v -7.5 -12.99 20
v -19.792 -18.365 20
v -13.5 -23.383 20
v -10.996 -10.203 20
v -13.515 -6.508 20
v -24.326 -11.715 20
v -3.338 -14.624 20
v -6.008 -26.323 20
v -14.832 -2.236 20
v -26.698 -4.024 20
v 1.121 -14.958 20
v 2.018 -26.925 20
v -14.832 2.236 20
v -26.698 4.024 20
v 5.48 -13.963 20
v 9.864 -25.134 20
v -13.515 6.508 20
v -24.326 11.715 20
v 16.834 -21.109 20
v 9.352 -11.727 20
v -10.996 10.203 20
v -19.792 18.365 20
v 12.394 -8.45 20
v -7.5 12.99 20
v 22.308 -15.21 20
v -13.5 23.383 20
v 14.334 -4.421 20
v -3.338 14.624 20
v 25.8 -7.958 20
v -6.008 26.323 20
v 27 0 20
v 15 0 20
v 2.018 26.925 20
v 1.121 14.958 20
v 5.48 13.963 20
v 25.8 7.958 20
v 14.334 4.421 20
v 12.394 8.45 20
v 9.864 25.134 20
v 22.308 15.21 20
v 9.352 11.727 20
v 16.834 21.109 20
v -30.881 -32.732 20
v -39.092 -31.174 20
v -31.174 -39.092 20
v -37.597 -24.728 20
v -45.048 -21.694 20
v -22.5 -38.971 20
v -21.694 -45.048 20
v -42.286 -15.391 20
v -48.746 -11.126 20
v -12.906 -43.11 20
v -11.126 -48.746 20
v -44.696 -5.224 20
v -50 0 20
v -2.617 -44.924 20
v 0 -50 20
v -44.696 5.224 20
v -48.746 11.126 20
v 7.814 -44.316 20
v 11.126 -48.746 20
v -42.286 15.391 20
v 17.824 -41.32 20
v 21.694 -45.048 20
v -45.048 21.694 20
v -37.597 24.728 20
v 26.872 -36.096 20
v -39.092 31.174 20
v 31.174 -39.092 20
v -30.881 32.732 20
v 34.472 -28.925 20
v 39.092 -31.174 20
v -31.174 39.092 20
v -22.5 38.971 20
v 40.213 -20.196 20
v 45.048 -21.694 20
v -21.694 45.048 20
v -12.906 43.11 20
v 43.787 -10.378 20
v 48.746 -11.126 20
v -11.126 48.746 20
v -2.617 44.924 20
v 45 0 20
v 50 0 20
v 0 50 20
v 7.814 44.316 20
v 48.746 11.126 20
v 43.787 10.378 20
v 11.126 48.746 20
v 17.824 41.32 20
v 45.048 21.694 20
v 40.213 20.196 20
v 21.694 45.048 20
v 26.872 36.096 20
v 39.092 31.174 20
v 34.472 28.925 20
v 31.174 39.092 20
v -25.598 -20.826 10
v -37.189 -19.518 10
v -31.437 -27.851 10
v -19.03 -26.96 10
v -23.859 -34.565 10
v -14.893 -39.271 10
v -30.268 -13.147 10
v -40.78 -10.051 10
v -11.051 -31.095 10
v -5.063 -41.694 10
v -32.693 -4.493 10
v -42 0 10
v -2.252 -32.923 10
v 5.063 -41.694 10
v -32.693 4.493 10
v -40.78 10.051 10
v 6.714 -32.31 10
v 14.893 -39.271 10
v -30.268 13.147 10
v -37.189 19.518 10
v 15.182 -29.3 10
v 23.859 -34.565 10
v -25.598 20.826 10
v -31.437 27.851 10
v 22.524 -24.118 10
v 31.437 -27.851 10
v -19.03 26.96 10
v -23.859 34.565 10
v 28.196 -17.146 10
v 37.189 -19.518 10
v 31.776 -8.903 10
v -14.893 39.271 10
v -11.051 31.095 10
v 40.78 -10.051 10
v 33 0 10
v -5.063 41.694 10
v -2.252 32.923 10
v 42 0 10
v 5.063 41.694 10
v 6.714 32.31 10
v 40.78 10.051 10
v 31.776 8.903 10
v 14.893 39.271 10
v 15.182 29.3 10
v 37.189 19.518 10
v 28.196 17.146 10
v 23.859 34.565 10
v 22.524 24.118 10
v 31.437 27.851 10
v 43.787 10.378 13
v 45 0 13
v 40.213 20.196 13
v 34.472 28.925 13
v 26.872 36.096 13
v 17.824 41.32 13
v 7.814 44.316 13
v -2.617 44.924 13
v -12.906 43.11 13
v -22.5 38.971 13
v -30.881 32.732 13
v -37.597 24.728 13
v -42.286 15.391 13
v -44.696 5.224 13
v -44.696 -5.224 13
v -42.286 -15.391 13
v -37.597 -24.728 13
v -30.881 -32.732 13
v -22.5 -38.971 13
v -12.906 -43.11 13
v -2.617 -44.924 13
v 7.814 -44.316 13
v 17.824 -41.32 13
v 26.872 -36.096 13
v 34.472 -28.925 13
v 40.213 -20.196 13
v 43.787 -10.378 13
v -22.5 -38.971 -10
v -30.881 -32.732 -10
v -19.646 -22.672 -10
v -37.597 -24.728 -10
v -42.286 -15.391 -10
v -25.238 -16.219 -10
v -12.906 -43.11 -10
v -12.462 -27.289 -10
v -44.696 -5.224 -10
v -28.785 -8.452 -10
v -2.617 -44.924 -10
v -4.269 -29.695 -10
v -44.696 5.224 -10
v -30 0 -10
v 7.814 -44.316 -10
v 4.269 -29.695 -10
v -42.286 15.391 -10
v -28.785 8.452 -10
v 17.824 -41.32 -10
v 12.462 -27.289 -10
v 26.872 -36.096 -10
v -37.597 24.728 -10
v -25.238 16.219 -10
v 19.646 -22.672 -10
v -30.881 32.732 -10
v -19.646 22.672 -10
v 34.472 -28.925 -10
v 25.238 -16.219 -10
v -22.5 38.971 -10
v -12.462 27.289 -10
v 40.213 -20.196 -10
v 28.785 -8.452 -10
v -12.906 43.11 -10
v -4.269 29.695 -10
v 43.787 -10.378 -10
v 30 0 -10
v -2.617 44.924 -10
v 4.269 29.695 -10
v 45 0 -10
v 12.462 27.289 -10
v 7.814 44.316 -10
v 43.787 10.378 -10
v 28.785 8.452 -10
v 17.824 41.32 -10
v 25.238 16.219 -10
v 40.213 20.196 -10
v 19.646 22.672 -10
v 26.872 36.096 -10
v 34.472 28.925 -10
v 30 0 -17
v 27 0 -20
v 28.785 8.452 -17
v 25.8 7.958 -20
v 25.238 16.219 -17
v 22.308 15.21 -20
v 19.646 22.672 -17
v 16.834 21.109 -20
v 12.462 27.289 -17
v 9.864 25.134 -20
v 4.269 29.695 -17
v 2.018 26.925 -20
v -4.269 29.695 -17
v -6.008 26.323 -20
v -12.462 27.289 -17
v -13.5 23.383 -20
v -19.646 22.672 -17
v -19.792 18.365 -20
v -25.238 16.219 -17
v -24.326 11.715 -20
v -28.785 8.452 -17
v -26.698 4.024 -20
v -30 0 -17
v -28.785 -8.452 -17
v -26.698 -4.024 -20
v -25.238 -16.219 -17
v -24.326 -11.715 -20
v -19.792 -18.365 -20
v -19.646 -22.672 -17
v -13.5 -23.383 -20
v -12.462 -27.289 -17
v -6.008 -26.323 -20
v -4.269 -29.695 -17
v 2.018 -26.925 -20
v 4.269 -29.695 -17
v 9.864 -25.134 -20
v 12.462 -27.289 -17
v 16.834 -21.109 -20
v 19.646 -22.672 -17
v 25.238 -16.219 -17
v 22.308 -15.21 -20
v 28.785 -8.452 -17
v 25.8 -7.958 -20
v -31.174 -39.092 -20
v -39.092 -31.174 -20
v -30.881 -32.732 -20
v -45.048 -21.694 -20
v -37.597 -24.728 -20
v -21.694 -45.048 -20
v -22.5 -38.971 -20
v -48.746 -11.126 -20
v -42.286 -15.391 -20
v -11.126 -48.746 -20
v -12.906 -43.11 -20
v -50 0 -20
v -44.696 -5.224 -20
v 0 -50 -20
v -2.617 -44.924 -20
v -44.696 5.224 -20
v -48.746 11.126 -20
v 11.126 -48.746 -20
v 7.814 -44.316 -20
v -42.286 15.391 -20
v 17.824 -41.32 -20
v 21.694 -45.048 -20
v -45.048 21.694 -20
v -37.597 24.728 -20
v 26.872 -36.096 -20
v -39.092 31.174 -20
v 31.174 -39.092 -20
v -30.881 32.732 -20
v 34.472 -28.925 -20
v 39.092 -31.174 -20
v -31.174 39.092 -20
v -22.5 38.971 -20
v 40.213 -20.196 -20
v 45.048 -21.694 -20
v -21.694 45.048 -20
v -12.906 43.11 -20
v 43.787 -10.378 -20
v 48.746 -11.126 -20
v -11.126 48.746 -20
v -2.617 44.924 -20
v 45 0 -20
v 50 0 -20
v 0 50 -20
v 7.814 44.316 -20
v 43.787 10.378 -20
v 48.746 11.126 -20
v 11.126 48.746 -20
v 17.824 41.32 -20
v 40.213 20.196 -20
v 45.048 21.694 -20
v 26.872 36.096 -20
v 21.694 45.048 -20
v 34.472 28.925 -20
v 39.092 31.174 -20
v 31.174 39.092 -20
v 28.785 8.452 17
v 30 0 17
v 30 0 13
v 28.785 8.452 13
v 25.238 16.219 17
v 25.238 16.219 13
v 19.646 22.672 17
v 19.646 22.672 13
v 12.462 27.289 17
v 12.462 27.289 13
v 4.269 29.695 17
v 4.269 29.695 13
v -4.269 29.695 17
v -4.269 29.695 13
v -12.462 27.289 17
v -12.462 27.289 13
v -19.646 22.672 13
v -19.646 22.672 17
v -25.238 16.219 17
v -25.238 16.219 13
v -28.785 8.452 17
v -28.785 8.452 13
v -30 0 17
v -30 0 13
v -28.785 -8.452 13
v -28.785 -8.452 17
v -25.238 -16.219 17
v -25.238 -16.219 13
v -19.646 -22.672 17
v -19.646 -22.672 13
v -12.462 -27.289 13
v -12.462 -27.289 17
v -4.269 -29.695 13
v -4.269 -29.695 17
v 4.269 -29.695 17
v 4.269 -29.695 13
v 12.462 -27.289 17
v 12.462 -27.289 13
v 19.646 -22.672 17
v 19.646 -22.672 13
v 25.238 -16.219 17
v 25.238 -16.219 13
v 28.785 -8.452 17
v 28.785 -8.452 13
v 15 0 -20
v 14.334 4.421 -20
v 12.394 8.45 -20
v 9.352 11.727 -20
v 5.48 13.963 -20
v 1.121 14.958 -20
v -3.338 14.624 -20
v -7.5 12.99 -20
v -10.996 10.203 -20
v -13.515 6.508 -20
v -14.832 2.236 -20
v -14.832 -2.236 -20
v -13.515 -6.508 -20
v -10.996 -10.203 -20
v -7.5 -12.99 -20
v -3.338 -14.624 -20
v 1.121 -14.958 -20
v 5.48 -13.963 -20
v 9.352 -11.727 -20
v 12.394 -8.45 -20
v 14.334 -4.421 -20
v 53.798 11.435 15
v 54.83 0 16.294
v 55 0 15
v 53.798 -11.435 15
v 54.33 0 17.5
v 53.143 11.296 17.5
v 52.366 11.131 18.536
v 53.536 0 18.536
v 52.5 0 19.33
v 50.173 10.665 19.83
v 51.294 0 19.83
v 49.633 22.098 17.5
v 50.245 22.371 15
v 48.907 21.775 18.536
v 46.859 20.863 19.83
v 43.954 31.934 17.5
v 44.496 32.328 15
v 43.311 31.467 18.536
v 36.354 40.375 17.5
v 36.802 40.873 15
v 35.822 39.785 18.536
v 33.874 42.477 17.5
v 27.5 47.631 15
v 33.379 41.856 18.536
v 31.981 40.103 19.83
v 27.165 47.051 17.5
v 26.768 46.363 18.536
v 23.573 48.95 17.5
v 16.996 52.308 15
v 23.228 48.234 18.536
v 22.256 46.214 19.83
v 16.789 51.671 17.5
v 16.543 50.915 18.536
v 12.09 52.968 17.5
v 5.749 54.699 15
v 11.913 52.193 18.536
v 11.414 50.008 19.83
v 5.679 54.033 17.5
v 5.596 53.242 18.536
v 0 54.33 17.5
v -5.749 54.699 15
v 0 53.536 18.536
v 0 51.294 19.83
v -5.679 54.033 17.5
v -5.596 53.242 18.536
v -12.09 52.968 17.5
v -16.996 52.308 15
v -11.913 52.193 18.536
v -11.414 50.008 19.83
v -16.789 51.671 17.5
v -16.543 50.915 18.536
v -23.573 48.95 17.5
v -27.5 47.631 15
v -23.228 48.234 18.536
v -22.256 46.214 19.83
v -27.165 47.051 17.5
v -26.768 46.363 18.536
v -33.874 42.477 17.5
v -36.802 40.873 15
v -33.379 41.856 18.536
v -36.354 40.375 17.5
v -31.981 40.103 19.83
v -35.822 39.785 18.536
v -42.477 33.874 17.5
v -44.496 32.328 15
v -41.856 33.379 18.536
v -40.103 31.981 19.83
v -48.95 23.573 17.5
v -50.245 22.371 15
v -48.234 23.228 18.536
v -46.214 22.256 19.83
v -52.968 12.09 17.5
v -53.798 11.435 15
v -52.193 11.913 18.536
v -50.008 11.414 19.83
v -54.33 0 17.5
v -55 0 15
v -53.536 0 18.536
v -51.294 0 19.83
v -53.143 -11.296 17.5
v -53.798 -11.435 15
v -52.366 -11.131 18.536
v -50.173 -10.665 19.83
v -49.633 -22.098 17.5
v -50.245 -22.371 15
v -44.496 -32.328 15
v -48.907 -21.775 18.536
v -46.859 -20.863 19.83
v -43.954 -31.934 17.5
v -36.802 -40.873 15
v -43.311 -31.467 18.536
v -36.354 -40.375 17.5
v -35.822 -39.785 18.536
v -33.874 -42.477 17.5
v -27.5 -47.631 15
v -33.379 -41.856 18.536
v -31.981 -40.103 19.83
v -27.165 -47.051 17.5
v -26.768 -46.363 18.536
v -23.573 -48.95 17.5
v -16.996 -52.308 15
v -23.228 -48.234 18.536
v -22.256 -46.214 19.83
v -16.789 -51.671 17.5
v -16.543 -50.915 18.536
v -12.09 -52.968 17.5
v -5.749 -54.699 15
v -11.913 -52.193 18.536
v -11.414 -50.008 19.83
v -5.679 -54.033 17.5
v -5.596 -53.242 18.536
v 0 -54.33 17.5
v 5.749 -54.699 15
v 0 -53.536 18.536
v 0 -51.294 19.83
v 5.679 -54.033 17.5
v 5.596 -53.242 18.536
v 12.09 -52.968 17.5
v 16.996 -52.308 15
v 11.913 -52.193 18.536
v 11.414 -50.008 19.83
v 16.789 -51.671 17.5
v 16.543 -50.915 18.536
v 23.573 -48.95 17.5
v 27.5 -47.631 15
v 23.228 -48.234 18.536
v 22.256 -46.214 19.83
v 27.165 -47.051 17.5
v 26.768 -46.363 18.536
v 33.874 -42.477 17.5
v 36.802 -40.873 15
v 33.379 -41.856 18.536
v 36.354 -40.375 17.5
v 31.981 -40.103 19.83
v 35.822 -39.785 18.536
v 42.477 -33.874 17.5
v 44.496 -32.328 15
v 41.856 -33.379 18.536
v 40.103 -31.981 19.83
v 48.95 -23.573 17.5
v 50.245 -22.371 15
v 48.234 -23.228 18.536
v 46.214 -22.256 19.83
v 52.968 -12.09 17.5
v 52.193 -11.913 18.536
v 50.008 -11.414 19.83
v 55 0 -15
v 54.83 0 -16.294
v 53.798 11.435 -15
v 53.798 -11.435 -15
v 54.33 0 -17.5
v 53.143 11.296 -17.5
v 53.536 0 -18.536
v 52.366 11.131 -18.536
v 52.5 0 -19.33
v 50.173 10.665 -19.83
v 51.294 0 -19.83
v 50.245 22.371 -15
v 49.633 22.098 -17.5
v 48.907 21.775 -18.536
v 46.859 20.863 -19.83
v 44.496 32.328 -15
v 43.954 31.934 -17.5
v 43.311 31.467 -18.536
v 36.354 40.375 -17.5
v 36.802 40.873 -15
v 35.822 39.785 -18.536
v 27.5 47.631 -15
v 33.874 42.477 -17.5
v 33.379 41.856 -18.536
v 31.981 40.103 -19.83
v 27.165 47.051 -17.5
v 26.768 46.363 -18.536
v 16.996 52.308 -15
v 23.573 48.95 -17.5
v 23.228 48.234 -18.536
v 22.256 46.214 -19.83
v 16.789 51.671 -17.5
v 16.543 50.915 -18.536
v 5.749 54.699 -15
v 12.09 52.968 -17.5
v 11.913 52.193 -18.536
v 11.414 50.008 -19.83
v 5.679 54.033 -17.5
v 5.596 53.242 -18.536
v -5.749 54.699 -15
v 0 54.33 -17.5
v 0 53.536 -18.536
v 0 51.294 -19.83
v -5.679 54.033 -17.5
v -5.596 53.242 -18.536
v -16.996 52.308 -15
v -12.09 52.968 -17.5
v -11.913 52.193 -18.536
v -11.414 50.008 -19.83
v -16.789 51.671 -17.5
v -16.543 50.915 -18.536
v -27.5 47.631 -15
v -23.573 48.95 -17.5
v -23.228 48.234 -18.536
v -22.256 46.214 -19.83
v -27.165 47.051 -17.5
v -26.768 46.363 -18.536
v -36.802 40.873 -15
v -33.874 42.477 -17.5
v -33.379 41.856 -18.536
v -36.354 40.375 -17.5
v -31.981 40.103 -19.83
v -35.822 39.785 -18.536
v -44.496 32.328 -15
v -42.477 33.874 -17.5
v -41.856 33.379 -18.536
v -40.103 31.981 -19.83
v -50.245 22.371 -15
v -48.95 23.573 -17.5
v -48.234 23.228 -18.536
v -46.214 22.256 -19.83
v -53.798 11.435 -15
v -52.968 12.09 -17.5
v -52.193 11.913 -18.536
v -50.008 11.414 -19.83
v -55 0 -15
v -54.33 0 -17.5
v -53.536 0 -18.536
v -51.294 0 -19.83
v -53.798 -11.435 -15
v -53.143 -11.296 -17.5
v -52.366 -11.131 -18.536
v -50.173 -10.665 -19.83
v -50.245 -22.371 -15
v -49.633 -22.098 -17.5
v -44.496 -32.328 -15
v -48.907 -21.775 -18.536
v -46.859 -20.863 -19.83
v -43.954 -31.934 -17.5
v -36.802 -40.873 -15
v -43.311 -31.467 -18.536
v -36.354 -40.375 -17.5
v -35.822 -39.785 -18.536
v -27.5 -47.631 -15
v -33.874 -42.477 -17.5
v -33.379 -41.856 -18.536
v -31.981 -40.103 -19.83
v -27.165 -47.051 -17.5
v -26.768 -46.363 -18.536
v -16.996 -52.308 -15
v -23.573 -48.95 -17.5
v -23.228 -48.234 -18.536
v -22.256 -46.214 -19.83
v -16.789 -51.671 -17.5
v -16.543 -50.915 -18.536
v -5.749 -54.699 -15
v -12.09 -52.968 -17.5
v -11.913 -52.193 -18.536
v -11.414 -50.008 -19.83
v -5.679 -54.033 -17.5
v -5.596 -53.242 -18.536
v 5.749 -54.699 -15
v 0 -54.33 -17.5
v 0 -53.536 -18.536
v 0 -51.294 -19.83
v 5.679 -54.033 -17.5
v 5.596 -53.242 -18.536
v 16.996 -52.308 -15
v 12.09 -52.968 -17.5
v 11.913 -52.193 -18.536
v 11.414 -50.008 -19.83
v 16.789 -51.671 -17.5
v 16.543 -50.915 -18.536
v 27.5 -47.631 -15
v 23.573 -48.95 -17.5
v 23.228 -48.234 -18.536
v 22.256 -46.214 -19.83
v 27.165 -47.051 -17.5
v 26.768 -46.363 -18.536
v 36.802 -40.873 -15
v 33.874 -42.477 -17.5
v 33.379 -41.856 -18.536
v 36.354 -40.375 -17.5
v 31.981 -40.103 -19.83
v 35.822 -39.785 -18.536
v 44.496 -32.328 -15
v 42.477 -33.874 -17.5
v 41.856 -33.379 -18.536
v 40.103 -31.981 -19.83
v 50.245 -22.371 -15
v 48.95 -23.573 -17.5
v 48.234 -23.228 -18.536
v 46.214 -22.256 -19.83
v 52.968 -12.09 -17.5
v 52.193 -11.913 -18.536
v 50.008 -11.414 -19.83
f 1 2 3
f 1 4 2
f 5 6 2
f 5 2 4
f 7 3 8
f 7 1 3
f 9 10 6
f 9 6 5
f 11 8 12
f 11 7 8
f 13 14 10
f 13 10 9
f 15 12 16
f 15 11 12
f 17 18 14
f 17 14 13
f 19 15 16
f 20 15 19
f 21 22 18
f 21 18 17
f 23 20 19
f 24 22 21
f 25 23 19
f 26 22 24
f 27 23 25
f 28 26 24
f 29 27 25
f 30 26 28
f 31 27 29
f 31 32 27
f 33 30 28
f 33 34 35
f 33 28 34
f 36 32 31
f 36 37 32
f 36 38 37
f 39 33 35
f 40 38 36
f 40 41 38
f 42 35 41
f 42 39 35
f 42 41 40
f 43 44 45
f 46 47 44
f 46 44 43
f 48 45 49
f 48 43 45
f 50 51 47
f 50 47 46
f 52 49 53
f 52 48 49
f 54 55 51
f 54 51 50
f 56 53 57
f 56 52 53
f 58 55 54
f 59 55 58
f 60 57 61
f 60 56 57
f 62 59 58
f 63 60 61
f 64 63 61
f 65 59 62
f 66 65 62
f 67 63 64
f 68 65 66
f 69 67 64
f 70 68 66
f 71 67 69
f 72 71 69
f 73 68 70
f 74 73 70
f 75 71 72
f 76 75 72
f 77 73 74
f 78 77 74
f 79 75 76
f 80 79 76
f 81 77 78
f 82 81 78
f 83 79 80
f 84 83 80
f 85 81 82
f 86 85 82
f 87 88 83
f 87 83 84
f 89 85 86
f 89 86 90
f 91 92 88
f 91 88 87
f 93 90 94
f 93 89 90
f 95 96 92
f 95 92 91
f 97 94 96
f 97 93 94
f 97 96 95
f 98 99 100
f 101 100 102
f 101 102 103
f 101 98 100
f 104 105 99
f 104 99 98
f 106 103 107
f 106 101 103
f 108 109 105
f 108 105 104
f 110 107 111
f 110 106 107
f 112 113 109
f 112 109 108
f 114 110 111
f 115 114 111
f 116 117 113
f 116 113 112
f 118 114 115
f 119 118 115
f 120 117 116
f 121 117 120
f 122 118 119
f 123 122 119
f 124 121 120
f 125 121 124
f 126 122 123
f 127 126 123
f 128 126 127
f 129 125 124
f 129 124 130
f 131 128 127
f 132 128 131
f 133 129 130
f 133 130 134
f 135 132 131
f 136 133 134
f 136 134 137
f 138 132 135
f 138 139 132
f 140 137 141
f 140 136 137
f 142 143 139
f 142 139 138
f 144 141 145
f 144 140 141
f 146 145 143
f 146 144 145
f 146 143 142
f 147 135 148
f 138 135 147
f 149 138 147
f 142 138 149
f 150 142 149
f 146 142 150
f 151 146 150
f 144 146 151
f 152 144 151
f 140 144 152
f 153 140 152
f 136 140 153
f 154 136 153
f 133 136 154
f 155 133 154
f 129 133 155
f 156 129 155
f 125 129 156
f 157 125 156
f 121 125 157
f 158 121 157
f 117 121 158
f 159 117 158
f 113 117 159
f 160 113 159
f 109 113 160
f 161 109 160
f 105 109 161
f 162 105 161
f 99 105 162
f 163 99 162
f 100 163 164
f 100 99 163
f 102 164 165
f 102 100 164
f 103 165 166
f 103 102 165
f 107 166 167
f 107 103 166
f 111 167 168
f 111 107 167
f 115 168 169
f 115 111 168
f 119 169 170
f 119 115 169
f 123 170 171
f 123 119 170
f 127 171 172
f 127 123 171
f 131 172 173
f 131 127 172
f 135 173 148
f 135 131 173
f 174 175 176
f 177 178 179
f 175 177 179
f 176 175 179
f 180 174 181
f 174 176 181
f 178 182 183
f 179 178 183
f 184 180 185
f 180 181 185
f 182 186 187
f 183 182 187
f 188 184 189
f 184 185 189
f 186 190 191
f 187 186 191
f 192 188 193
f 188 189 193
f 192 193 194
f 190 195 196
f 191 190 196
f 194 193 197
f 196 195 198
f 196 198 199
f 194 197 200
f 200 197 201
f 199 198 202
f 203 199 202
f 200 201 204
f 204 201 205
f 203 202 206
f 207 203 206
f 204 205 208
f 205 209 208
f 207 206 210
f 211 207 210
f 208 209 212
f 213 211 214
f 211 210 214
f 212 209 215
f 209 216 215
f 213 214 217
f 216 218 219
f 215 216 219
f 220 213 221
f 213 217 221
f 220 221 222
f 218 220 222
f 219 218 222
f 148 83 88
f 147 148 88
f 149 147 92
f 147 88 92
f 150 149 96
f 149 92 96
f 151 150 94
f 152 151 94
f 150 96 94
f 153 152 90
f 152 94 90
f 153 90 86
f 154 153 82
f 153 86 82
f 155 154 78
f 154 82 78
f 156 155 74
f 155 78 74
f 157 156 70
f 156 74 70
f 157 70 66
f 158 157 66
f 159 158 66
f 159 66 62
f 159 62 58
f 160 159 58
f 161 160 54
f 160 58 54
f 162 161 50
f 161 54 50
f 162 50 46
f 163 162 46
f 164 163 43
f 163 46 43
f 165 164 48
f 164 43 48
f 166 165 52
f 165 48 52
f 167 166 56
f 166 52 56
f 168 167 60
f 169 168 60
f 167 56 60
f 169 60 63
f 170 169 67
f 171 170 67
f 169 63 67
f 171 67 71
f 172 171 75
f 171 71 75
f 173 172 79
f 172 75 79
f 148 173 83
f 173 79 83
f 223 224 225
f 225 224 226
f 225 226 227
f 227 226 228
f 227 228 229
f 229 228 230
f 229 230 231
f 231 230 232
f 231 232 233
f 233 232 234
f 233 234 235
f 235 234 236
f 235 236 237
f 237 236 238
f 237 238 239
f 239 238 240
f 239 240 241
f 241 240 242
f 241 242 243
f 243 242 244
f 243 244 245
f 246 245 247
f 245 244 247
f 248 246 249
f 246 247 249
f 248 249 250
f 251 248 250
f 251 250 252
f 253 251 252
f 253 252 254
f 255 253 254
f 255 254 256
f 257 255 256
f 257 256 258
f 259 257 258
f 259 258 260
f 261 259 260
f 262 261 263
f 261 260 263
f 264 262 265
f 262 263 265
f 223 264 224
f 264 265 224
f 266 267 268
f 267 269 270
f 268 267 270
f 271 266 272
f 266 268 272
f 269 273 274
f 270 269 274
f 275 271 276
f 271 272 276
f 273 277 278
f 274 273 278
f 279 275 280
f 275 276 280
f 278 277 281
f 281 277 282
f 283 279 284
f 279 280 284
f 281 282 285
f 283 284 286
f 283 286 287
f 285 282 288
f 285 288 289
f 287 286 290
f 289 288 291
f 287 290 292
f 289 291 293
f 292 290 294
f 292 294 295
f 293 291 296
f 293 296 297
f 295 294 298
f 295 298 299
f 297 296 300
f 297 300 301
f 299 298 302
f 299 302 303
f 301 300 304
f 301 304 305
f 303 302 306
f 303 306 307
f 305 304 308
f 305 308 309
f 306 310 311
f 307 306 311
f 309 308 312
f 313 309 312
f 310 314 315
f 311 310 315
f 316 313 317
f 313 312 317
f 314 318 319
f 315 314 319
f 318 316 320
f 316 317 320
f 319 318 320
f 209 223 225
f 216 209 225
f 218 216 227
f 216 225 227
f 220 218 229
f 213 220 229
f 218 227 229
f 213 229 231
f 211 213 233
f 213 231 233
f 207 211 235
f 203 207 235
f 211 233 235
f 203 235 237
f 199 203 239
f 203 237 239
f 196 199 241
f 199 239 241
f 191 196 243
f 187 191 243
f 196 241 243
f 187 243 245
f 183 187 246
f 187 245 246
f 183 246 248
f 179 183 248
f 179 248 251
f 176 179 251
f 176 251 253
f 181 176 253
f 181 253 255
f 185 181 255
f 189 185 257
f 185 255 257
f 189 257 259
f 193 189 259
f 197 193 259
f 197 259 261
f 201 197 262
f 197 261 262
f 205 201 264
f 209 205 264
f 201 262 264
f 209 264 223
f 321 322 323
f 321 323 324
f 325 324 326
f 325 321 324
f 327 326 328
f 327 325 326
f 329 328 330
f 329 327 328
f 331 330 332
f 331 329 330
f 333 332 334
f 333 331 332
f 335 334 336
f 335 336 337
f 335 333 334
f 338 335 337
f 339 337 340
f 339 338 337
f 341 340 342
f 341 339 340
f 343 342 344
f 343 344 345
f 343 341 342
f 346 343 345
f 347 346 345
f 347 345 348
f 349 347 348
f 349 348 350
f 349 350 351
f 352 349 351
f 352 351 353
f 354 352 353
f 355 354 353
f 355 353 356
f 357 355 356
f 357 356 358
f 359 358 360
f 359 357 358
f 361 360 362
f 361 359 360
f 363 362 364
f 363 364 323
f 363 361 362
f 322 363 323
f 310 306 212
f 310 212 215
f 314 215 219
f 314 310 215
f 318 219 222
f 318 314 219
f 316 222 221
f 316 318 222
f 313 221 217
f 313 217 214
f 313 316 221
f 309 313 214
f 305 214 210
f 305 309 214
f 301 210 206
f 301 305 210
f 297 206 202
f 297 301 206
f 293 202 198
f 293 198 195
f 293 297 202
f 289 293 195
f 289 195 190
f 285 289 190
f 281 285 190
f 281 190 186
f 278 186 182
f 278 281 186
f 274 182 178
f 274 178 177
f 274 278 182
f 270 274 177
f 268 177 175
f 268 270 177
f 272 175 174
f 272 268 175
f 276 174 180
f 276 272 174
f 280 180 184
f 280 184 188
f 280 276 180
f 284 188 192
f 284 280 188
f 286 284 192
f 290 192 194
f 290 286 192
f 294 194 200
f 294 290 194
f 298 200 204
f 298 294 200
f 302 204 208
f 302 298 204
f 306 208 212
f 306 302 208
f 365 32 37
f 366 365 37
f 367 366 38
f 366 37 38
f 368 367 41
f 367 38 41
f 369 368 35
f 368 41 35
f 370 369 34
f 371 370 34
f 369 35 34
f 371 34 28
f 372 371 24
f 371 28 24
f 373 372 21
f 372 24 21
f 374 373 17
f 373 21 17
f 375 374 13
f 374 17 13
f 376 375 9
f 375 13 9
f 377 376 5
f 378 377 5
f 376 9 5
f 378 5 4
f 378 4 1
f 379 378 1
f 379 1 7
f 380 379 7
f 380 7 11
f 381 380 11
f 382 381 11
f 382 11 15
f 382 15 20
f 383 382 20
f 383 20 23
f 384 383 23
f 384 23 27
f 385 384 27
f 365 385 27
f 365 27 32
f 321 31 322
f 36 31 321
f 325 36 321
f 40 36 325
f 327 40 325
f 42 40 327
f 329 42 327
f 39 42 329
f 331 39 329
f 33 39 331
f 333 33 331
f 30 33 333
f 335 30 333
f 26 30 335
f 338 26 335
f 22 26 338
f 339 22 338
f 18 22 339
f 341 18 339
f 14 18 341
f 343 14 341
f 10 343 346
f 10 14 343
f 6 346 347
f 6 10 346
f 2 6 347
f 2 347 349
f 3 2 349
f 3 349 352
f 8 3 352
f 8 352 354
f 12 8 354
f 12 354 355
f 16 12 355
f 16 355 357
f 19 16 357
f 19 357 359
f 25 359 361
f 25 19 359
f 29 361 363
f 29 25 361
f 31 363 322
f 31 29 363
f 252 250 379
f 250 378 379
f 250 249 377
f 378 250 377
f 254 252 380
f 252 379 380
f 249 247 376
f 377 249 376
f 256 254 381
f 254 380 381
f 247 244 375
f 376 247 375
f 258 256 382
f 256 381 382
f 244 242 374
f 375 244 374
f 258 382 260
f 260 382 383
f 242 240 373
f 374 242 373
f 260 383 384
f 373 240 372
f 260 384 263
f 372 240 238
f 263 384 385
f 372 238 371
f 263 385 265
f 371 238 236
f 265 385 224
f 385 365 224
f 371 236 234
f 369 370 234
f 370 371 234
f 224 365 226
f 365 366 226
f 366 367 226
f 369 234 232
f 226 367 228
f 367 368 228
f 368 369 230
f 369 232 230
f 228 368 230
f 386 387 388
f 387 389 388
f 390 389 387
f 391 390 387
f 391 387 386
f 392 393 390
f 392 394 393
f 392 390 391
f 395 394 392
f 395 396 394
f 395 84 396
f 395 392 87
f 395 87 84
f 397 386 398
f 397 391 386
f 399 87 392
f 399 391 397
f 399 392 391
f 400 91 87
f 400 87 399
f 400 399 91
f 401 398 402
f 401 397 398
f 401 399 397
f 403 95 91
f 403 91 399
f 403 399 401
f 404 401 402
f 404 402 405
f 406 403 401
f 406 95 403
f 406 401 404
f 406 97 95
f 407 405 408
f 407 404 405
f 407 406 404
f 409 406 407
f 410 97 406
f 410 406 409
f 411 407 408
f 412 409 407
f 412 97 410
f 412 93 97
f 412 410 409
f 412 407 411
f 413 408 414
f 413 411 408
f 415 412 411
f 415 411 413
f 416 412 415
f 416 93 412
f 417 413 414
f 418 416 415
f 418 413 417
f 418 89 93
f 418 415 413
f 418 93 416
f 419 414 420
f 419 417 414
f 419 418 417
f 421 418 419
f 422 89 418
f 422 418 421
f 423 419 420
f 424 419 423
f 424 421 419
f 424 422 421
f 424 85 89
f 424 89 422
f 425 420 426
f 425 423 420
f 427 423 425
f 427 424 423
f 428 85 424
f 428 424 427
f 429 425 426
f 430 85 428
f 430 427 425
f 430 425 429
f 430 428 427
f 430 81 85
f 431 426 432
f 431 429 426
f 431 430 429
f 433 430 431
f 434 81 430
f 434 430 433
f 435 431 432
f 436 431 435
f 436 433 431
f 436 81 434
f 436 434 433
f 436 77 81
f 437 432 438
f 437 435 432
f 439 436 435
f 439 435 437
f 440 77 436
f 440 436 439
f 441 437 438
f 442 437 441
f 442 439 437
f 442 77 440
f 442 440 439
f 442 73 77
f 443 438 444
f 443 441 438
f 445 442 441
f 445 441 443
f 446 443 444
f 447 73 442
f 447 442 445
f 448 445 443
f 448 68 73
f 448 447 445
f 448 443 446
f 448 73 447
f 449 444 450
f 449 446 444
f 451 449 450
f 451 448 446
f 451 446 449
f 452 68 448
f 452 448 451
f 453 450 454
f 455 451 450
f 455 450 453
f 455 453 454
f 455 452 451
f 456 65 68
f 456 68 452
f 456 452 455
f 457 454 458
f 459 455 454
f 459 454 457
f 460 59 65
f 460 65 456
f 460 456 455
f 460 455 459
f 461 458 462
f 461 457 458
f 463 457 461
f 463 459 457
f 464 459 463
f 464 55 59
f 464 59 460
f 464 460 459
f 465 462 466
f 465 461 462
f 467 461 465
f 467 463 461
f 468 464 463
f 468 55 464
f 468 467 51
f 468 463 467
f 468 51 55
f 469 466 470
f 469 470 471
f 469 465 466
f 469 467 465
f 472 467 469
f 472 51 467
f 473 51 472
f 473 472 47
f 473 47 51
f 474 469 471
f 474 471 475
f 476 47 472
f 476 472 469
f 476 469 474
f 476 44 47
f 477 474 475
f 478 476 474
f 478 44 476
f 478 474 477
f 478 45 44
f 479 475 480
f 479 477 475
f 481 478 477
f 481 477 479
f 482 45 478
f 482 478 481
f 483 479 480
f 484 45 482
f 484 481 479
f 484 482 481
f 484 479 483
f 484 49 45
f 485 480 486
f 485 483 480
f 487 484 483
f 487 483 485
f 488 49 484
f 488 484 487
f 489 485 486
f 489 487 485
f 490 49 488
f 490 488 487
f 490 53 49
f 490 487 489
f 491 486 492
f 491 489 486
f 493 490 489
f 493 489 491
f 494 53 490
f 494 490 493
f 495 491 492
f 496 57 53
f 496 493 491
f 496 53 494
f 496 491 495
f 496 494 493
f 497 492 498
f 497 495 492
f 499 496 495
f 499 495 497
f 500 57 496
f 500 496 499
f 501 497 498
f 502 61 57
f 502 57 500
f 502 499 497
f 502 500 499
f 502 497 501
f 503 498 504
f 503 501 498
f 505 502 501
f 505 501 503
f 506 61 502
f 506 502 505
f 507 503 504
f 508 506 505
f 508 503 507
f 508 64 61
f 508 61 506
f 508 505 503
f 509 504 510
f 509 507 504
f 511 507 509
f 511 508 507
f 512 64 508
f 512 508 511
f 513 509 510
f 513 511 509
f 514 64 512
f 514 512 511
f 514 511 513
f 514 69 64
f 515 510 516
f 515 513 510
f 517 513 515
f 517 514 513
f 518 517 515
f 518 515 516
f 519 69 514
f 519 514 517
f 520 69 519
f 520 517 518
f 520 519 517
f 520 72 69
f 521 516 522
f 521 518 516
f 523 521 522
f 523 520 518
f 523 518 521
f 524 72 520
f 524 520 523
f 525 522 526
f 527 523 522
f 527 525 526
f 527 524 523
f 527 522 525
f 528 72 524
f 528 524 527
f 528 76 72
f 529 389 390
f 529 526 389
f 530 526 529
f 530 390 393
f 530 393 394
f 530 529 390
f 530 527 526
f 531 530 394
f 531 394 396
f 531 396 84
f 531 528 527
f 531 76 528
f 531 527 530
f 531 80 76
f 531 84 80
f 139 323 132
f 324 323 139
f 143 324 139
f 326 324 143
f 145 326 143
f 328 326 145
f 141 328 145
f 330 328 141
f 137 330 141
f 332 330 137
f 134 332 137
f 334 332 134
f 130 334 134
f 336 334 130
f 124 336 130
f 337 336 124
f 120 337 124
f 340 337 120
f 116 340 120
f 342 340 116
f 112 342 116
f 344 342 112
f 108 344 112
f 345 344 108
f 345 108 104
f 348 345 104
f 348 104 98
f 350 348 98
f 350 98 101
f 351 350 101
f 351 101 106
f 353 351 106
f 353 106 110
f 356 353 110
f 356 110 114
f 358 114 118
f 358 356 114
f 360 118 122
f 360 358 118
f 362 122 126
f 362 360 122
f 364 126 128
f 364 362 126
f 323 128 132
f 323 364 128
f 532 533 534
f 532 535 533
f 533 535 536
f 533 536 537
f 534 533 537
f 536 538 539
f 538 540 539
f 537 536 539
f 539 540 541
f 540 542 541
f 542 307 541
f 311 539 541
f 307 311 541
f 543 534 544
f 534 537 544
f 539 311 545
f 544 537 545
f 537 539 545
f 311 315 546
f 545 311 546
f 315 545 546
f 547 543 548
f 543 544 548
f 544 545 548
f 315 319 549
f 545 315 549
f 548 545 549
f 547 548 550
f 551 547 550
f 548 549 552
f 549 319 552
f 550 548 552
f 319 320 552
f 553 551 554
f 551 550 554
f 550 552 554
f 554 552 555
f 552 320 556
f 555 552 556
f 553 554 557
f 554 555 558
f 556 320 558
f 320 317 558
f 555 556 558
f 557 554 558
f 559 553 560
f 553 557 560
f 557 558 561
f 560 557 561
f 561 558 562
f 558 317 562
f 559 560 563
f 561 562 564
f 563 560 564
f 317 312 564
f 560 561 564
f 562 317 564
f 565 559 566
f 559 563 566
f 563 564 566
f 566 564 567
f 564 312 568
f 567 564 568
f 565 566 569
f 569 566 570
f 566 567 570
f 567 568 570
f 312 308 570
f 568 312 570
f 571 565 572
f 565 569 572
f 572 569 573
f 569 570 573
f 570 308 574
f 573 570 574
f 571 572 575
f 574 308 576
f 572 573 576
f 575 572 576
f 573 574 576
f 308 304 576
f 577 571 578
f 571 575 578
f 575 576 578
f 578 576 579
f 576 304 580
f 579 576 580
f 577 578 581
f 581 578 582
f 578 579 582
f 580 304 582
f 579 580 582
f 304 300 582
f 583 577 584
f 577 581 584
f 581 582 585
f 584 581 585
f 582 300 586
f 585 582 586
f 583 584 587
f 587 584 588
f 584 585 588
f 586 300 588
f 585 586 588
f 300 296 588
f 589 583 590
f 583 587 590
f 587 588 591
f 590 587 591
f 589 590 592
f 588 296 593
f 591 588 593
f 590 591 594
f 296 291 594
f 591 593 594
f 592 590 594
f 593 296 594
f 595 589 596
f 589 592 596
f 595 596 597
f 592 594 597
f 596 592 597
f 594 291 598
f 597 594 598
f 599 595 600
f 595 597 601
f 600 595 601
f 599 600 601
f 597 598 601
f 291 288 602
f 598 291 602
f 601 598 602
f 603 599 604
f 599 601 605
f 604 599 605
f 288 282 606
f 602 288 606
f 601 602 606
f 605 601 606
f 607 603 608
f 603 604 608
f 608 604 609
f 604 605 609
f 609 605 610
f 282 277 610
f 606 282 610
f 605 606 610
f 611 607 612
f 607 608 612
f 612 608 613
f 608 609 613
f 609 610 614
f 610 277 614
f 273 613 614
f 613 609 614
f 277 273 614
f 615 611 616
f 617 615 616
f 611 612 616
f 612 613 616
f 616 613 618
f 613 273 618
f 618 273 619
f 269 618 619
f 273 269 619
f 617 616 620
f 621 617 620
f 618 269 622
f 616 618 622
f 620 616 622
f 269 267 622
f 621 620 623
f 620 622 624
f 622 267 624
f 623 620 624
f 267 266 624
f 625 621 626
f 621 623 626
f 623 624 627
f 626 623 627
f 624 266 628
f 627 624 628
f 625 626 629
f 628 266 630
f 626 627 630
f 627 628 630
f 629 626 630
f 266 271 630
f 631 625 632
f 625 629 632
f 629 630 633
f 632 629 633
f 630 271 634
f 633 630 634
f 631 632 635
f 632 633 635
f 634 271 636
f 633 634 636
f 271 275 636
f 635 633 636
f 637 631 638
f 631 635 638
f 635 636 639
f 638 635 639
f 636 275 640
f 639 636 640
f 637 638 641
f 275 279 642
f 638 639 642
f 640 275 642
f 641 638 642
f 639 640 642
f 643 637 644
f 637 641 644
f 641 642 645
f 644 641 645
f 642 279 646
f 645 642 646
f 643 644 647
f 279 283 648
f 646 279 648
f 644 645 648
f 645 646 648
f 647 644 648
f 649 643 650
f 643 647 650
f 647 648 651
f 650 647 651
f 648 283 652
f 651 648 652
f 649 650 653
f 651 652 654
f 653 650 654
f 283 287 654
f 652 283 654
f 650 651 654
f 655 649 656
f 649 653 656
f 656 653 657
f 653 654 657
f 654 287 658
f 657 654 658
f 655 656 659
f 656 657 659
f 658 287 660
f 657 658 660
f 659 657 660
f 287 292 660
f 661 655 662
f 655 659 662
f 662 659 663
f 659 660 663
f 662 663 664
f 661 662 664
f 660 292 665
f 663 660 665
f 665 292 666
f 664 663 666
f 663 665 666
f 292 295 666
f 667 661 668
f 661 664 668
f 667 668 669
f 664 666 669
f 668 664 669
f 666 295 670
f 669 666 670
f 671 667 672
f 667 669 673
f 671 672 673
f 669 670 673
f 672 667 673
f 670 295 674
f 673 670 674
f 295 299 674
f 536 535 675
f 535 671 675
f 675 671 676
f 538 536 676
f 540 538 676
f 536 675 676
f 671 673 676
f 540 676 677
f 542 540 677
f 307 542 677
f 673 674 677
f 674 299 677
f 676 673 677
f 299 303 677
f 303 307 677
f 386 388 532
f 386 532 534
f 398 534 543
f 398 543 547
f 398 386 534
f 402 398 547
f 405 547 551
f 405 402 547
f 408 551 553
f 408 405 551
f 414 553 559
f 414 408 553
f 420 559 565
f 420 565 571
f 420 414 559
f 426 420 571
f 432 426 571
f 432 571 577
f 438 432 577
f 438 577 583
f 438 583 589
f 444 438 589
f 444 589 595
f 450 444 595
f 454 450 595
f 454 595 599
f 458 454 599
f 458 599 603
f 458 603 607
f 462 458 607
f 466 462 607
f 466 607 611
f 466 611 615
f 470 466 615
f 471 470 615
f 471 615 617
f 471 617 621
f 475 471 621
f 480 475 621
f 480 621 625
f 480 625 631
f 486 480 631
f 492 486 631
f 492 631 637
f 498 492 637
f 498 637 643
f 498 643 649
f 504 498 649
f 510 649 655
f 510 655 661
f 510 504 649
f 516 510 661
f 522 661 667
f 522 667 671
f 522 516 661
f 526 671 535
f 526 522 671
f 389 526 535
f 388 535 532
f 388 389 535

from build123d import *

# Parameters (mm, degrees)
SKETCH1_R           = 55
BOSS_EXTRUDE1_DEPTH = 20
SKETCH2_R           = 45
SKETCH2_R_2         = 30
CUT_EXTRUDE2_DEPTH  = 10
SKETCH4_R           = 15
CUT_EXTRUDE3_DEPTH  = 87
FILLET1_R           = 5
CHAMFER1_SIZE       = 3


with BuildPart() as part:
    # Sketch1 → Boss-Extrude1 (new, symmetric)
    with BuildSketch(Plane.XY):
        Circle(SKETCH1_R)
    extrude(amount=BOSS_EXTRUDE1_DEPTH, both=True)

    # Sketch2 → Cut-Extrude2 (cut)
    with BuildSketch(Plane.XY.offset(20)):
        Circle(SKETCH2_R)
        Circle(SKETCH2_R_2, mode=Mode.SUBTRACT)
    cut_extrude2 = extrude(amount=-CUT_EXTRUDE2_DEPTH, mode=Mode.SUBTRACT)

    # Mirror1: Cut-Extrude2 across plane
    add(cut_extrude2.mirror(Plane.XY), mode=Mode.SUBTRACT)

    # Sketch4 → Cut-Extrude3 (cut)
    with BuildSketch(Plane.XY.offset(20)):
        Circle(SKETCH4_R)
    extrude(amount=-CUT_EXTRUDE3_DEPTH, mode=Mode.SUBTRACT)

    # Fillet1
    fillet1_edges = [part.edges().sort_by_distance(p)[0] for p in [
        (-55, 0, -20),
        (-55, 0, 20),
    ]]
    fillet(fillet1_edges, radius=FILLET1_R)

    # Chamfer1
    chamfer1_edges = [part.edges().sort_by_distance(p)[0] for p in [
        (-30, 0, -20),
        (-45, 0, 10),
        (-30, 0, 10),
        (-30, 0, 20),
    ]]
    chamfer(chamfer1_edges, length=CHAMFER1_SIZE)


solid = part.part
